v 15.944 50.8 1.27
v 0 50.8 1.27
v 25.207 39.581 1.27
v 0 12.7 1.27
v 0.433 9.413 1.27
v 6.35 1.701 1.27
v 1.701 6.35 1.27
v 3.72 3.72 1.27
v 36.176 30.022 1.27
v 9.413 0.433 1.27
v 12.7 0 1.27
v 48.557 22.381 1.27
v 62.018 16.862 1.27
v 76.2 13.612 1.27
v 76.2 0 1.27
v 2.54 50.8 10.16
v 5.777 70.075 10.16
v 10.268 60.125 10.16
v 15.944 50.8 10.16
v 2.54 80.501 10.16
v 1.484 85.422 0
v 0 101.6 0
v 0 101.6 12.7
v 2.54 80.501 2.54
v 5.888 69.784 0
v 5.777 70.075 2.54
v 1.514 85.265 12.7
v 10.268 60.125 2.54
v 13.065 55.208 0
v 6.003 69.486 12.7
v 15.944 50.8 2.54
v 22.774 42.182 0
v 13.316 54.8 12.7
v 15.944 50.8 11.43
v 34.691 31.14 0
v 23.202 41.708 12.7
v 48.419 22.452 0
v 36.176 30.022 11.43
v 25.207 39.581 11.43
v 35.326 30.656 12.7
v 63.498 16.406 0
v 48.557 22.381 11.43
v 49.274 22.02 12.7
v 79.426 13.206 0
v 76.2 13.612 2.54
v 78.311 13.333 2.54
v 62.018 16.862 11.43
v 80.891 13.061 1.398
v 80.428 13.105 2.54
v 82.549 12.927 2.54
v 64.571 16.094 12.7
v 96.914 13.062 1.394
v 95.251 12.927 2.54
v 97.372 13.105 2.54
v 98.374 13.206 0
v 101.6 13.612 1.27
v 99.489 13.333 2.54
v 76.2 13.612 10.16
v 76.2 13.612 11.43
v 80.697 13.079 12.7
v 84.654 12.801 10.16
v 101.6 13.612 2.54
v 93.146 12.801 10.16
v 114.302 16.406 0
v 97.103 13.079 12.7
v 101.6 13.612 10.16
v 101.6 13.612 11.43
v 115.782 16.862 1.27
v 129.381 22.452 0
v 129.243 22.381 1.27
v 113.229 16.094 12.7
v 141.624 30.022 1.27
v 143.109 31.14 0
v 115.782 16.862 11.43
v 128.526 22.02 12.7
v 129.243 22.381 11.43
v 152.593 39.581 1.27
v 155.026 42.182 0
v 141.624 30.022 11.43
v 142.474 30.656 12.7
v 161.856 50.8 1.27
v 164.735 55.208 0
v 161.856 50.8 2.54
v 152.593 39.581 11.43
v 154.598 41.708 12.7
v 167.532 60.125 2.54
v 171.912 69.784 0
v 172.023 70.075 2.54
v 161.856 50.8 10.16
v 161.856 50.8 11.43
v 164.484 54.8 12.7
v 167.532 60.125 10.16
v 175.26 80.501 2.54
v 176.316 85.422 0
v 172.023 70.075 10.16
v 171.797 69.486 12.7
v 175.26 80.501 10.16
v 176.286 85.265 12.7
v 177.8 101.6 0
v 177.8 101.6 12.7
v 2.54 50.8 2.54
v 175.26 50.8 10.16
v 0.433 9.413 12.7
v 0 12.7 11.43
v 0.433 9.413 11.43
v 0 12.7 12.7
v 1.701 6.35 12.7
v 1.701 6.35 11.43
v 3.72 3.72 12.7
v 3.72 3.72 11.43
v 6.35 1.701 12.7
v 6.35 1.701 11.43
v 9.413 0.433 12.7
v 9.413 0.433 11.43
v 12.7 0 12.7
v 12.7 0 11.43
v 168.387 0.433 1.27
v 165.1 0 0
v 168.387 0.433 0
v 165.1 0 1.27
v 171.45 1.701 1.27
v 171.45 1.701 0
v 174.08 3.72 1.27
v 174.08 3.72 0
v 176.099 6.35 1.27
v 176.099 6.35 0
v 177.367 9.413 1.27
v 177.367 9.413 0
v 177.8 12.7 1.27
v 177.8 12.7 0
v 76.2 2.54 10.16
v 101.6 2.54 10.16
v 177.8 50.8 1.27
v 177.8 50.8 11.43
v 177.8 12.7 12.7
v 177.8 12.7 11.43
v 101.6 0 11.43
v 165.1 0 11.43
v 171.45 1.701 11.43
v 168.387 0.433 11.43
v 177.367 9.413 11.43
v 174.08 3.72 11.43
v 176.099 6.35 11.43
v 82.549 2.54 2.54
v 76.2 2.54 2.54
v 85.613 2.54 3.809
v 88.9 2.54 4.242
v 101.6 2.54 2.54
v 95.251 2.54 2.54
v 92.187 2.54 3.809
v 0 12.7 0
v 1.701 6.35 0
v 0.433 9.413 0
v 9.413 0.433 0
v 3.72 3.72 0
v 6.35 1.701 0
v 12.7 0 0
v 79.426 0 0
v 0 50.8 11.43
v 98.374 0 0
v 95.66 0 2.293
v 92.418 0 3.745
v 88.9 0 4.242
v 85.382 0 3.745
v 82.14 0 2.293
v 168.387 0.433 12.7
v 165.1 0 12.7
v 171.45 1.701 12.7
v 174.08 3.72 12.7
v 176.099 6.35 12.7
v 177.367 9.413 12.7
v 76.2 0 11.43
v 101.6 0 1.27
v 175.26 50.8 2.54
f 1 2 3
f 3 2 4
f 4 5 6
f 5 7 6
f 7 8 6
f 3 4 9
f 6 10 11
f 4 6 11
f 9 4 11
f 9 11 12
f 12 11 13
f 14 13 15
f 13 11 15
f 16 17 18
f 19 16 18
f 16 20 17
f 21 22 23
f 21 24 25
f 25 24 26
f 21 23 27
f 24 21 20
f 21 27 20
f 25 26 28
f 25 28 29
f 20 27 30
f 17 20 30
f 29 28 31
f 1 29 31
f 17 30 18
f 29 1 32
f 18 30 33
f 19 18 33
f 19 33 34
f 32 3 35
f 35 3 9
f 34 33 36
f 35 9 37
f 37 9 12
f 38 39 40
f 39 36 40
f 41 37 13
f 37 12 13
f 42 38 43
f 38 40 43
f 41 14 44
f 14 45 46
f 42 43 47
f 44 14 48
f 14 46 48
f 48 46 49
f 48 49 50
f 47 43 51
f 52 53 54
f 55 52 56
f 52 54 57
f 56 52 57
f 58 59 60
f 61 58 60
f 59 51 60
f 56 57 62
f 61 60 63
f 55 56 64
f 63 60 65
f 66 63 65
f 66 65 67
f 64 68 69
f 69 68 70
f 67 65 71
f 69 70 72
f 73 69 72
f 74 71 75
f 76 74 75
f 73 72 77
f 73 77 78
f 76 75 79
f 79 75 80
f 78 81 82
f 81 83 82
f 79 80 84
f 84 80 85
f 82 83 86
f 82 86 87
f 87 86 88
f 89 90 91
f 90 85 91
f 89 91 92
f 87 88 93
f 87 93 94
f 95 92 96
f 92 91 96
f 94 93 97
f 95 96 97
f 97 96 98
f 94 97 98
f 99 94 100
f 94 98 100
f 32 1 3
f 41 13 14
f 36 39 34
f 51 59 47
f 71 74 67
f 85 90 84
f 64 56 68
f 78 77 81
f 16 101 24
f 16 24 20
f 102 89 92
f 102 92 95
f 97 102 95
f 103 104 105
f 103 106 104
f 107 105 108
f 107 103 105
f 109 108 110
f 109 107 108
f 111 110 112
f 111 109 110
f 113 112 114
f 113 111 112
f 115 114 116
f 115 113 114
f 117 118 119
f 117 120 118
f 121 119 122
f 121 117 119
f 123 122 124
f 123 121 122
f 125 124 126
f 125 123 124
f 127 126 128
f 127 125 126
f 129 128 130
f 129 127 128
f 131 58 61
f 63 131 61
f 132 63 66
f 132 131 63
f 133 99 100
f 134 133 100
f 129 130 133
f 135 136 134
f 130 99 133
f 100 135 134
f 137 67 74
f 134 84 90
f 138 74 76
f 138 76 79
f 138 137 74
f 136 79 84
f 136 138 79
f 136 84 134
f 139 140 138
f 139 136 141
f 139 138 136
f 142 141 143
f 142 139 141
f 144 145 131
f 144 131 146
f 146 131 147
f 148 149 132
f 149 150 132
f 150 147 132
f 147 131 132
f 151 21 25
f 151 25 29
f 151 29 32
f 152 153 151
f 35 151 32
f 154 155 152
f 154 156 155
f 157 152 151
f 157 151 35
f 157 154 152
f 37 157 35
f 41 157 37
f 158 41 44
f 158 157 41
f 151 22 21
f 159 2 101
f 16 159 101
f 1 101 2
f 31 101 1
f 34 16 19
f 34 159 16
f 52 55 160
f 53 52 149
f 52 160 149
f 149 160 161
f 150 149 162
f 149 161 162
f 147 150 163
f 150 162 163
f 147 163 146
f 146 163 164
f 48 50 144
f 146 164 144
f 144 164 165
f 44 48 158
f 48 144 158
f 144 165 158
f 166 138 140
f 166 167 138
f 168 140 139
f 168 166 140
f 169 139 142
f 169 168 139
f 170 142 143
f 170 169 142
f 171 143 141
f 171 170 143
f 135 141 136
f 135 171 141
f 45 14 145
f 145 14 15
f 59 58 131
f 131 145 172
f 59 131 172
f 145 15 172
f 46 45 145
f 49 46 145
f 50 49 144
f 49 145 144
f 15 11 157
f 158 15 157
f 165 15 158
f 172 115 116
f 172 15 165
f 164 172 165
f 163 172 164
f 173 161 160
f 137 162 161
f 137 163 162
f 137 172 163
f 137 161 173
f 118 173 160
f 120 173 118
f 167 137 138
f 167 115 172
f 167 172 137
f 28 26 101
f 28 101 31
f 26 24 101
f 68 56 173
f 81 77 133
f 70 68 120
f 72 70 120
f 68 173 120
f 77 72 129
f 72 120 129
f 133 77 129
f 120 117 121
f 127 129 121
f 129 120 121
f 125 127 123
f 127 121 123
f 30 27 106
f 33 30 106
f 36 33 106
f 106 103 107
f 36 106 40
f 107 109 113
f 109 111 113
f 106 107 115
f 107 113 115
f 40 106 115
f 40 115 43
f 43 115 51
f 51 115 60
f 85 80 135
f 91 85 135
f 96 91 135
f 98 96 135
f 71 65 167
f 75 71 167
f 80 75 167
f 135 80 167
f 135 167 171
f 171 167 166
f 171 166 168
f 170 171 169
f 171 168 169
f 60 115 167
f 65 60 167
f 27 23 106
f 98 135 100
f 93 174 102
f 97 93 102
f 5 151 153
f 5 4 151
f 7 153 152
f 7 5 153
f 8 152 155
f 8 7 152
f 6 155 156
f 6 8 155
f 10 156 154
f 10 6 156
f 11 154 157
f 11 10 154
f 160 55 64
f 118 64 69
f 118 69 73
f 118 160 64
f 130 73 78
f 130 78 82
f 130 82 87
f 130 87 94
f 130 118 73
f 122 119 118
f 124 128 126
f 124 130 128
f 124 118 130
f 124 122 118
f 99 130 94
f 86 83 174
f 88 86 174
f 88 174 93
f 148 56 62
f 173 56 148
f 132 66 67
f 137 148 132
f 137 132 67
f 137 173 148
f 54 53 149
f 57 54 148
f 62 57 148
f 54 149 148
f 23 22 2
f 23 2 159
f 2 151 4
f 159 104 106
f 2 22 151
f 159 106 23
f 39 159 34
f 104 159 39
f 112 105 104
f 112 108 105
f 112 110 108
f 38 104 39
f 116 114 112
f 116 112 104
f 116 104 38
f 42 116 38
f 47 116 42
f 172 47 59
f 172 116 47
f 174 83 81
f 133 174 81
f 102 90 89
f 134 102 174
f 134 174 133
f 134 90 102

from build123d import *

# Parameters (mm, degrees)
F0_W     = 177.8
F0_H     = 12.7
F1_DEPTH = 101.6
F2_R     = 88.9
F3_DEPTH = 25.4
F4_T     = -2.54
F5_W     = 76.2
F5_H     = 10.16
F6_DEPTH = 50.8
F7_R     = 12.7
F8_R     = 12.7
F9_DEPTH = 25.4


with BuildPart() as f1:
    # F0 (on Front) → F1 (new body)
    with BuildSketch(Plane.XZ):
        with Locations((88.9, 6.35)):
            Rectangle(F0_W, F0_H)
    extrude(amount=-F1_DEPTH)

    # F2 (on face) → F3 (cut)
    with BuildSketch(Plane.XY.offset(12.7)):
        with Locations((88.9, 101.6)):
            Circle(F2_R)
    extrude(amount=-F3_DEPTH, mode=Mode.SUBTRACT)

    # F4
    f4_openings = [f1.faces().sort_by_distance(p)[0] for p in [
        (88.9, 12.7, 6.35),
    ]]
    offset(amount=F4_T, openings=f4_openings, kind=Kind.INTERSECTION)

    # F5 (on face) → F6 (cut)
    with BuildSketch(Plane.XZ):
        with Locations((38.1, 6.35)):
            Rectangle(F5_W, F5_H)
        with Locations((139.7, 6.35)):
            Rectangle(F5_W, F5_H)
    extrude(amount=-F6_DEPTH, mode=Mode.SUBTRACT)

    # F7
    f7_edges = [f1.edges().sort_by_distance(p)[0] for p in [
        (177.8, 0, 12.065),
        (177.8, 0, 0.635),
        (0, 0, 12.065),
        (0, 0, 0.635),
    ]]
    fillet(f7_edges, radius=F7_R)

    # F8 (on face) → F9 (cut)
    with BuildSketch(Plane.XZ):
        with Locations((88.9, -8.4582)):
            Circle(F8_R)
    extrude(amount=-F9_DEPTH, mode=Mode.SUBTRACT)


solid = f1.part
